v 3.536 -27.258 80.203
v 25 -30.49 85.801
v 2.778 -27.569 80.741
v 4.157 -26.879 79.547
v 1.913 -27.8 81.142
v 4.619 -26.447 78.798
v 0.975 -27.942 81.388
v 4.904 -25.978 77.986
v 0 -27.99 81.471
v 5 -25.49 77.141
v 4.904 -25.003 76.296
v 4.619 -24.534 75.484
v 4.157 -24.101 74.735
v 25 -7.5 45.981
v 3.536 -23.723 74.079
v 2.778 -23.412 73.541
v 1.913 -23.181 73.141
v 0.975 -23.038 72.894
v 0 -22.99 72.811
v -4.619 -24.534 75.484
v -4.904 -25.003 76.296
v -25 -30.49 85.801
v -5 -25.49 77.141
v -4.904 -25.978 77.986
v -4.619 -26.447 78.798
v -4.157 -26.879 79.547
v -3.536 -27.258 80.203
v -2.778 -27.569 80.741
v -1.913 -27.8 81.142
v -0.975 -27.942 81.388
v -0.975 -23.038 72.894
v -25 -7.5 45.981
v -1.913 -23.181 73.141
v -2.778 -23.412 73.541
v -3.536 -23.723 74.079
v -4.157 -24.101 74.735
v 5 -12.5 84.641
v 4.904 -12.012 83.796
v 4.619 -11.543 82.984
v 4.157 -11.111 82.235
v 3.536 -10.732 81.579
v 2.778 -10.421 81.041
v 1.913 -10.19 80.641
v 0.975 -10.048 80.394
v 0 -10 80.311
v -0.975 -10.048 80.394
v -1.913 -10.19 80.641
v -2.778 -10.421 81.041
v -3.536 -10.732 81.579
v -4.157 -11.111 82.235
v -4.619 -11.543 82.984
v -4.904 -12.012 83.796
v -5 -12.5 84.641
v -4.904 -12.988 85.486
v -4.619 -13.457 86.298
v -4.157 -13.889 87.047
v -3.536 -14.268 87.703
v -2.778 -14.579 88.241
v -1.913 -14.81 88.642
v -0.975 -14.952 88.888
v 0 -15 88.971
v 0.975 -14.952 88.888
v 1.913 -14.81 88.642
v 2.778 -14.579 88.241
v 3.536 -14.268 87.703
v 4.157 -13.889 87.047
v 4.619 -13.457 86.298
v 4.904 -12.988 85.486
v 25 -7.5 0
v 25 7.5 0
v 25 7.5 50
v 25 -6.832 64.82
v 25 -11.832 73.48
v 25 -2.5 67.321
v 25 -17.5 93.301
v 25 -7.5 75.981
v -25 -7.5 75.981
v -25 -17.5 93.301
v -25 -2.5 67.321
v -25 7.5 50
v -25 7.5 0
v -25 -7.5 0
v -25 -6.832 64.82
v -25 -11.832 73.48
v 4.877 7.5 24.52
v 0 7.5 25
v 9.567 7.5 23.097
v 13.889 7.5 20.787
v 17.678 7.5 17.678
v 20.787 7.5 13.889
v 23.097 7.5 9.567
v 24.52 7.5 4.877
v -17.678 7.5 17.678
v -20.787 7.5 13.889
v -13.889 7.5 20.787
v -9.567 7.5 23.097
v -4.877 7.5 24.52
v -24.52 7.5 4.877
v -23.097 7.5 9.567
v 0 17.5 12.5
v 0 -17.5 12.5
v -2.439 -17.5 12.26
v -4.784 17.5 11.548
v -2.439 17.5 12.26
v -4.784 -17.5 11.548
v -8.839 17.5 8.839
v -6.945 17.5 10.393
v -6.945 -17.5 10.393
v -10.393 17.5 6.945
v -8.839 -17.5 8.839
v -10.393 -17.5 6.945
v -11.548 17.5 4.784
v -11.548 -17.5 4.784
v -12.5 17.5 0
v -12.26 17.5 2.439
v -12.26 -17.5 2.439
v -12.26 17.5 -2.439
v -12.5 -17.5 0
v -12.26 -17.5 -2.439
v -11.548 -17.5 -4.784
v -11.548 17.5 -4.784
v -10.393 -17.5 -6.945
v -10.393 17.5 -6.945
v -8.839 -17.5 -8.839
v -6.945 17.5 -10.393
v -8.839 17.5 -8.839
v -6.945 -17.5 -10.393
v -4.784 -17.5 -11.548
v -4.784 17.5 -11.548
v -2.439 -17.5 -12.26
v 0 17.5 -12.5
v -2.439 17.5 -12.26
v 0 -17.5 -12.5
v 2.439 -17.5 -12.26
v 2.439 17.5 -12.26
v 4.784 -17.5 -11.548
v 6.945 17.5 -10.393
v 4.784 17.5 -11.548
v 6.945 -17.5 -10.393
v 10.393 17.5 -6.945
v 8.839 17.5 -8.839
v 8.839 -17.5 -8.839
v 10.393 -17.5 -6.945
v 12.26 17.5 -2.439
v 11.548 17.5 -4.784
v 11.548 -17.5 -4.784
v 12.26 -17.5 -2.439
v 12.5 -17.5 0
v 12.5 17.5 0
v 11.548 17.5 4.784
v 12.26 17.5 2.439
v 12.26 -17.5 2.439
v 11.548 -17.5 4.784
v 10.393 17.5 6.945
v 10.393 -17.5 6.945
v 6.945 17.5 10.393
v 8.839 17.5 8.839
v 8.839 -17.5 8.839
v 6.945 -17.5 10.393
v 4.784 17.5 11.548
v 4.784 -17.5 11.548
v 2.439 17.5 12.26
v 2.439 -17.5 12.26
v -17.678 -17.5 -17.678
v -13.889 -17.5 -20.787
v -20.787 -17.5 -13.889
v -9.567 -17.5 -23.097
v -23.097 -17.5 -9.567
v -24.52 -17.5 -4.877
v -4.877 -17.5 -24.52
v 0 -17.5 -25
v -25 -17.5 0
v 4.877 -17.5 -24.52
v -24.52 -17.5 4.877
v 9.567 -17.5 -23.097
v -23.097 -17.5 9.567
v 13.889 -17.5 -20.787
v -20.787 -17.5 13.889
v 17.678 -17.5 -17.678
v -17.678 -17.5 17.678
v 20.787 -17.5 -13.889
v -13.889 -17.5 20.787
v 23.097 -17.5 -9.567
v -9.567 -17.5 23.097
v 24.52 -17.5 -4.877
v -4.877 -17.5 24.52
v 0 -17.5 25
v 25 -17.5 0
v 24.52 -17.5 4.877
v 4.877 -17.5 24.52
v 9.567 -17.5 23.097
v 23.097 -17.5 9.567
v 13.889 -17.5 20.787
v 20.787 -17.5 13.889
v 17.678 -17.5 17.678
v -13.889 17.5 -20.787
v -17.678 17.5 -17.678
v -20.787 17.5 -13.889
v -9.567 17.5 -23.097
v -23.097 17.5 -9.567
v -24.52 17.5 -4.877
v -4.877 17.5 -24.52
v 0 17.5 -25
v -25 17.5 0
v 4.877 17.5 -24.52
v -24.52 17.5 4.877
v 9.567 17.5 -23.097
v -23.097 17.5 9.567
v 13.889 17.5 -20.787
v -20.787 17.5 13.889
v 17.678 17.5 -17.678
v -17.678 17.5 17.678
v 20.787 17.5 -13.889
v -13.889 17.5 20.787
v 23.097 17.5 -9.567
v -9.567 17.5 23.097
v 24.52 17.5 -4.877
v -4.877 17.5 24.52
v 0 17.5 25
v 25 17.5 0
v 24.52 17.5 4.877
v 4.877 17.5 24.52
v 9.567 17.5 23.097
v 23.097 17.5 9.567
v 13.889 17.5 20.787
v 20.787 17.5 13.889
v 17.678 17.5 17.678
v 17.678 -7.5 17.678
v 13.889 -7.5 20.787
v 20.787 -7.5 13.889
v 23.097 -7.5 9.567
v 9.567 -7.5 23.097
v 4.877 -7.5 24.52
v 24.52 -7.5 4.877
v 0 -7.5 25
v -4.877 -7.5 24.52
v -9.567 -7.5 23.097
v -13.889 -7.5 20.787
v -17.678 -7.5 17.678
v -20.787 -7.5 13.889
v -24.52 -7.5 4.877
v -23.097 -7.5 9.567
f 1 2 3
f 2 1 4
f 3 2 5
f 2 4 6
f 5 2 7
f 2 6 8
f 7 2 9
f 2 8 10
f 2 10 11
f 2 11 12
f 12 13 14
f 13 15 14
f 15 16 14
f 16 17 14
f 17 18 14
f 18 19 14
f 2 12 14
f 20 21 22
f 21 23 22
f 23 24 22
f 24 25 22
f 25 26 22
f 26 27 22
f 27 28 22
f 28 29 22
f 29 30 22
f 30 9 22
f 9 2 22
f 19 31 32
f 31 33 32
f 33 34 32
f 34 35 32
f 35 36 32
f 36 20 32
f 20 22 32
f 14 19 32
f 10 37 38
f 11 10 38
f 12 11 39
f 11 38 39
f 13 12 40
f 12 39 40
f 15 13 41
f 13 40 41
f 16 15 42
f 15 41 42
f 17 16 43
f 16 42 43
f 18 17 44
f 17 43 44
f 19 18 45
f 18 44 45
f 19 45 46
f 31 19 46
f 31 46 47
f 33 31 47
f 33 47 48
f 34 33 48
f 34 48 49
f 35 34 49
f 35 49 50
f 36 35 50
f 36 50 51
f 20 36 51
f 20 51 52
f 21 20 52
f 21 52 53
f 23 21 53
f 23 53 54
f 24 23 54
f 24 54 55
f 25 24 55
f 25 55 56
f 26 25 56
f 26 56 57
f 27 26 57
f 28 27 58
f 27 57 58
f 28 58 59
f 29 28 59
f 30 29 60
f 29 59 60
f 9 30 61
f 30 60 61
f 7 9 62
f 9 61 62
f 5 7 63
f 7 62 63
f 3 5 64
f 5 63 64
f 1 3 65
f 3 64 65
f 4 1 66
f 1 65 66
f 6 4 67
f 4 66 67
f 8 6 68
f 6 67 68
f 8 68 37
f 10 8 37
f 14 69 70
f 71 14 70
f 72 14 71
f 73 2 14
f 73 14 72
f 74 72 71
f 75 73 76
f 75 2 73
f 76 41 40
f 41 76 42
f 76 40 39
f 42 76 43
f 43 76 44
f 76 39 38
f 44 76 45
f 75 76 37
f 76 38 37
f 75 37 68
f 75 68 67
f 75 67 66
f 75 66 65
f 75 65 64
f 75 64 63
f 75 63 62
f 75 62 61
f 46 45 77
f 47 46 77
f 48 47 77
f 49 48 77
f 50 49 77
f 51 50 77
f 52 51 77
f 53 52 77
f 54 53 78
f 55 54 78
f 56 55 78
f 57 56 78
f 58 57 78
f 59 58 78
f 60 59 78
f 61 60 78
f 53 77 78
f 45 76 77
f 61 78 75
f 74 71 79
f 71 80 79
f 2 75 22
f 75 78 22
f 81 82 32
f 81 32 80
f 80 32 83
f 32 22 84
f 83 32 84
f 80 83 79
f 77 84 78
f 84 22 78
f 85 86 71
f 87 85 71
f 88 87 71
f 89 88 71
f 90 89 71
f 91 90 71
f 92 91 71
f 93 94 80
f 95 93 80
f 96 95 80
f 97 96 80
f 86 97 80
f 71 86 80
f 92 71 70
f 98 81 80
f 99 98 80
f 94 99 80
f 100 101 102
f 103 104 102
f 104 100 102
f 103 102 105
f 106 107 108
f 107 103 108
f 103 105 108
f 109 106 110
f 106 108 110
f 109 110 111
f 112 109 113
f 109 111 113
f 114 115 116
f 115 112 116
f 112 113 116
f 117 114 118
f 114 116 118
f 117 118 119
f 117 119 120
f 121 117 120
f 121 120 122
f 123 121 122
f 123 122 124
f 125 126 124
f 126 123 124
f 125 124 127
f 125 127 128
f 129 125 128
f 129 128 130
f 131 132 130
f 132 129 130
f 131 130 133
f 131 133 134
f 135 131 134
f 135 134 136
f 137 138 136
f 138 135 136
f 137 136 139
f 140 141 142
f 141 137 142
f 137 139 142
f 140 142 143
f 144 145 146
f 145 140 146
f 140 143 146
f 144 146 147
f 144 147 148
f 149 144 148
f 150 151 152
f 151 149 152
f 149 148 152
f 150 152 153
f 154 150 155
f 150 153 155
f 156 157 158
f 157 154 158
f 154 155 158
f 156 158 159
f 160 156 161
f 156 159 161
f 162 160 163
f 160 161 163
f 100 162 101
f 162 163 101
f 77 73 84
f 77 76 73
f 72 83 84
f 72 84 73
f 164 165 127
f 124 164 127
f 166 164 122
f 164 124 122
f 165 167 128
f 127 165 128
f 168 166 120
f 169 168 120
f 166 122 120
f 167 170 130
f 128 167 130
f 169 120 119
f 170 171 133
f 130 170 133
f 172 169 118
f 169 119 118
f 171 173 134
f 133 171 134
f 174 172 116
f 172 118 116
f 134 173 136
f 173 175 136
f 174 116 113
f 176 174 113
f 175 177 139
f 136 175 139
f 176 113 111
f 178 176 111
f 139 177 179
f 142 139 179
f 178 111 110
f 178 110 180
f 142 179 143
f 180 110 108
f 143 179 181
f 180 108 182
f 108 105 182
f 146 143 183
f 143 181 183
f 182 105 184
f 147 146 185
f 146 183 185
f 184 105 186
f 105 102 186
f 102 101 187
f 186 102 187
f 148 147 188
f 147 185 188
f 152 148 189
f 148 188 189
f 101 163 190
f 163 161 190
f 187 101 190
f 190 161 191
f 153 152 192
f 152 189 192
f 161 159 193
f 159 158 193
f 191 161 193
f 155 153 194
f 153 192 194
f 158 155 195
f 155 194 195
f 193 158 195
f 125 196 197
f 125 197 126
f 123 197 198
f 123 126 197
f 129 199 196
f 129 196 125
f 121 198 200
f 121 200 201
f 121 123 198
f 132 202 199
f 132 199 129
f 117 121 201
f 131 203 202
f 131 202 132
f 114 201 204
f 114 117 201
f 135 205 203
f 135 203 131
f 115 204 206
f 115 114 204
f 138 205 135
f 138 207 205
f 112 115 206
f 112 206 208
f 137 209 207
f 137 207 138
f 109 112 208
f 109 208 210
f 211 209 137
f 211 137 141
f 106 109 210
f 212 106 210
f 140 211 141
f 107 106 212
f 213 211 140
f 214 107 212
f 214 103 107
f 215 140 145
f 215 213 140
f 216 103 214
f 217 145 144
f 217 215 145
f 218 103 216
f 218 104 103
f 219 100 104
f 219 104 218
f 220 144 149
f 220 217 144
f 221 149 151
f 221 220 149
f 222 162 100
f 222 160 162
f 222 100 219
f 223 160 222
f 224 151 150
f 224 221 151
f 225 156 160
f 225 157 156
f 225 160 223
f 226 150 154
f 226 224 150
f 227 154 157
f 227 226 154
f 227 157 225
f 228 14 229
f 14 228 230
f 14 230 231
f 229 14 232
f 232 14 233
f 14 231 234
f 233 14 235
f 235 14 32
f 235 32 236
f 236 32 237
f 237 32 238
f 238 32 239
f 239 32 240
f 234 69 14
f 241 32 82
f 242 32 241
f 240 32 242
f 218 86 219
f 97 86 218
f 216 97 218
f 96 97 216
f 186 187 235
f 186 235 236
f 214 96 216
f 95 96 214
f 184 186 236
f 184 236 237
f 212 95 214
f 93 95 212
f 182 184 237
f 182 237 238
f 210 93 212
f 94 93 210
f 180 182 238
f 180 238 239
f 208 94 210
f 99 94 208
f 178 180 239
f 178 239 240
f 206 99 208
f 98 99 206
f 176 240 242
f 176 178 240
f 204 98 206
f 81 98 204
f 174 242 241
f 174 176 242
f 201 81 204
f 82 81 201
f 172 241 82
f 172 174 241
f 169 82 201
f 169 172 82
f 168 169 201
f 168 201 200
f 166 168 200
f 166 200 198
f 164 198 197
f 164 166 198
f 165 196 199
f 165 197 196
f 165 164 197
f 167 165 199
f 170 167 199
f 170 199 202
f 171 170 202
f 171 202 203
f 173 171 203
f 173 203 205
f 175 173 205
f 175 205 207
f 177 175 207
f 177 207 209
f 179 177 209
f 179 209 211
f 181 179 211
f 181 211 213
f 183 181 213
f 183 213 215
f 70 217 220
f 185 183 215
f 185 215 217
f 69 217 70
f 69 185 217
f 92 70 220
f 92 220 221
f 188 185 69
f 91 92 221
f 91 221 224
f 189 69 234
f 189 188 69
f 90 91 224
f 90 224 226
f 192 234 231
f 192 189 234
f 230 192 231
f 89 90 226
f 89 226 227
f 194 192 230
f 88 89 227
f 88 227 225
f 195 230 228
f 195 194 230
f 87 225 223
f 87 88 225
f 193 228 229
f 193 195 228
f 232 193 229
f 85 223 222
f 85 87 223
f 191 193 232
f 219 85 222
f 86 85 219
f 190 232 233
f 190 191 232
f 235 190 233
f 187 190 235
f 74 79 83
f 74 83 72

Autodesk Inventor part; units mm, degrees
ref_plane "YZ Plane" through (0, 0, 0) normal (1, 0, 0) x (0, 1, 0)
ref_plane "XZ Plane" through (0, 0, 0) normal (0, 1, 0) x (-1, 0, 0)
ref_plane "XY Plane" through (0, 0, 0) normal (0, 0, 1) x (1, 0, 0)
sketch "Boceto1" plane through (0, 0, 0) normal (1, 0, 0) x (0, 1, 0)
  line L0 (-17.5, -25) -> (17.5, -25)
  line L1 (17.5, -25) -> (17.5, 25)
  line L2 (17.5, 25) -> (-17.5, 25)
  line L3 (-17.5, 25) -> (-17.5, -25)
  line L4 (7.5, 25) -> (7.5, 50)
  line L5 (-7.5, 45.9808) -> (-7.5, 25)
  line L6 (17.5, 12.5) -> (-17.5, 12.5)
  line L7 (17.5, -12.5) -> (-17.5, -12.5)
  line L8 (7.5, 50) -> (-17.5, 93.3013)
  line L9 (-17.5, 93.3013) -> (-30.4904, 85.8013)
  line L10 (-30.4904, 85.8013) -> (-7.5, 45.9808)
  line L11 (-40.0885, 0) -> (27.0981, 0) projected
  point P0 (0, 0)
  dimension "d0" = 10
  dimension "d1" = 10
  dimension "d2" = 15
  dimension "d3" = 25
  dimension "d5" = 12.5
  dimension "d6" = 50
  dimension "d7" = 12.5
  dimension "d8" = 7.5
  dimension "d9" = 25
  dimension "d10" = 50
  dimension "d11" = 15
  dimension "d12" = 150
revolve "Revolución1" add sketch "Boceto1" angle 360 about axis through (0, -10, 0) along (0, 1, 0) contours L3 L2 L1 L6
extrude "Extrusión1" add sketch "Boceto1" along normal mid plane 50 contours L5 L10 L9 L8 L4 L2
sketch "Boceto2" plane through (25, 7.5, 25) normal (0, 0, -1) x (-1, 0, 0)
  line L0 (25, -15) -> (25, 0) projected
  line L1 (25, 0) -> (0, 0) projected
  line L2 (0, -15) -> (0, 0) projected
  line L3 (25, -15) -> (0, -15) projected
  line L4 (50, -15) -> (25, -15) projected
  line L5 (50, 0) -> (50, -15) projected
  line L6 (50, 0) -> (25, 0) projected
  point P0 (25, -7.5)
extrude "Extrusión2" add sketch "Boceto2" along normal up to surface
sketch "Boceto3" plane through (-25, -17.5, 93.3013) normal (0, 0.866, 0.5) x (1, 0, 0)
  line L0 (0, 0) -> (0, 50) projected
  line L1 (0, 30) -> (50, 30)
  line L2 (50, 30) -> (50, 20)
  line L3 (50, 0) -> (50, 45.9808) projected
  line L4 (0, 30) -> (0, 20)
  line L5 (50, 20) -> (0, 20)
  line L6 (0, 50) -> (50, 50) projected
  circle A0 centre (25, 10) radius 5
  point P0 (25, 89.5513)
  point P1 (0, 25)
  dimension "d18" = 10
  dimension "d19" = 5
  dimension "d20" = 25
  dimension "d21" = 10
  dimension "d22" = 10
extrude "Extrusión3" cut sketch "Boceto3" against normal blind 5 contours L0 L1 L2 L5
extrude "Extrusión4" cut sketch "Boceto3" against normal through all contours A0
properties part number "Pieza de practica 14"
